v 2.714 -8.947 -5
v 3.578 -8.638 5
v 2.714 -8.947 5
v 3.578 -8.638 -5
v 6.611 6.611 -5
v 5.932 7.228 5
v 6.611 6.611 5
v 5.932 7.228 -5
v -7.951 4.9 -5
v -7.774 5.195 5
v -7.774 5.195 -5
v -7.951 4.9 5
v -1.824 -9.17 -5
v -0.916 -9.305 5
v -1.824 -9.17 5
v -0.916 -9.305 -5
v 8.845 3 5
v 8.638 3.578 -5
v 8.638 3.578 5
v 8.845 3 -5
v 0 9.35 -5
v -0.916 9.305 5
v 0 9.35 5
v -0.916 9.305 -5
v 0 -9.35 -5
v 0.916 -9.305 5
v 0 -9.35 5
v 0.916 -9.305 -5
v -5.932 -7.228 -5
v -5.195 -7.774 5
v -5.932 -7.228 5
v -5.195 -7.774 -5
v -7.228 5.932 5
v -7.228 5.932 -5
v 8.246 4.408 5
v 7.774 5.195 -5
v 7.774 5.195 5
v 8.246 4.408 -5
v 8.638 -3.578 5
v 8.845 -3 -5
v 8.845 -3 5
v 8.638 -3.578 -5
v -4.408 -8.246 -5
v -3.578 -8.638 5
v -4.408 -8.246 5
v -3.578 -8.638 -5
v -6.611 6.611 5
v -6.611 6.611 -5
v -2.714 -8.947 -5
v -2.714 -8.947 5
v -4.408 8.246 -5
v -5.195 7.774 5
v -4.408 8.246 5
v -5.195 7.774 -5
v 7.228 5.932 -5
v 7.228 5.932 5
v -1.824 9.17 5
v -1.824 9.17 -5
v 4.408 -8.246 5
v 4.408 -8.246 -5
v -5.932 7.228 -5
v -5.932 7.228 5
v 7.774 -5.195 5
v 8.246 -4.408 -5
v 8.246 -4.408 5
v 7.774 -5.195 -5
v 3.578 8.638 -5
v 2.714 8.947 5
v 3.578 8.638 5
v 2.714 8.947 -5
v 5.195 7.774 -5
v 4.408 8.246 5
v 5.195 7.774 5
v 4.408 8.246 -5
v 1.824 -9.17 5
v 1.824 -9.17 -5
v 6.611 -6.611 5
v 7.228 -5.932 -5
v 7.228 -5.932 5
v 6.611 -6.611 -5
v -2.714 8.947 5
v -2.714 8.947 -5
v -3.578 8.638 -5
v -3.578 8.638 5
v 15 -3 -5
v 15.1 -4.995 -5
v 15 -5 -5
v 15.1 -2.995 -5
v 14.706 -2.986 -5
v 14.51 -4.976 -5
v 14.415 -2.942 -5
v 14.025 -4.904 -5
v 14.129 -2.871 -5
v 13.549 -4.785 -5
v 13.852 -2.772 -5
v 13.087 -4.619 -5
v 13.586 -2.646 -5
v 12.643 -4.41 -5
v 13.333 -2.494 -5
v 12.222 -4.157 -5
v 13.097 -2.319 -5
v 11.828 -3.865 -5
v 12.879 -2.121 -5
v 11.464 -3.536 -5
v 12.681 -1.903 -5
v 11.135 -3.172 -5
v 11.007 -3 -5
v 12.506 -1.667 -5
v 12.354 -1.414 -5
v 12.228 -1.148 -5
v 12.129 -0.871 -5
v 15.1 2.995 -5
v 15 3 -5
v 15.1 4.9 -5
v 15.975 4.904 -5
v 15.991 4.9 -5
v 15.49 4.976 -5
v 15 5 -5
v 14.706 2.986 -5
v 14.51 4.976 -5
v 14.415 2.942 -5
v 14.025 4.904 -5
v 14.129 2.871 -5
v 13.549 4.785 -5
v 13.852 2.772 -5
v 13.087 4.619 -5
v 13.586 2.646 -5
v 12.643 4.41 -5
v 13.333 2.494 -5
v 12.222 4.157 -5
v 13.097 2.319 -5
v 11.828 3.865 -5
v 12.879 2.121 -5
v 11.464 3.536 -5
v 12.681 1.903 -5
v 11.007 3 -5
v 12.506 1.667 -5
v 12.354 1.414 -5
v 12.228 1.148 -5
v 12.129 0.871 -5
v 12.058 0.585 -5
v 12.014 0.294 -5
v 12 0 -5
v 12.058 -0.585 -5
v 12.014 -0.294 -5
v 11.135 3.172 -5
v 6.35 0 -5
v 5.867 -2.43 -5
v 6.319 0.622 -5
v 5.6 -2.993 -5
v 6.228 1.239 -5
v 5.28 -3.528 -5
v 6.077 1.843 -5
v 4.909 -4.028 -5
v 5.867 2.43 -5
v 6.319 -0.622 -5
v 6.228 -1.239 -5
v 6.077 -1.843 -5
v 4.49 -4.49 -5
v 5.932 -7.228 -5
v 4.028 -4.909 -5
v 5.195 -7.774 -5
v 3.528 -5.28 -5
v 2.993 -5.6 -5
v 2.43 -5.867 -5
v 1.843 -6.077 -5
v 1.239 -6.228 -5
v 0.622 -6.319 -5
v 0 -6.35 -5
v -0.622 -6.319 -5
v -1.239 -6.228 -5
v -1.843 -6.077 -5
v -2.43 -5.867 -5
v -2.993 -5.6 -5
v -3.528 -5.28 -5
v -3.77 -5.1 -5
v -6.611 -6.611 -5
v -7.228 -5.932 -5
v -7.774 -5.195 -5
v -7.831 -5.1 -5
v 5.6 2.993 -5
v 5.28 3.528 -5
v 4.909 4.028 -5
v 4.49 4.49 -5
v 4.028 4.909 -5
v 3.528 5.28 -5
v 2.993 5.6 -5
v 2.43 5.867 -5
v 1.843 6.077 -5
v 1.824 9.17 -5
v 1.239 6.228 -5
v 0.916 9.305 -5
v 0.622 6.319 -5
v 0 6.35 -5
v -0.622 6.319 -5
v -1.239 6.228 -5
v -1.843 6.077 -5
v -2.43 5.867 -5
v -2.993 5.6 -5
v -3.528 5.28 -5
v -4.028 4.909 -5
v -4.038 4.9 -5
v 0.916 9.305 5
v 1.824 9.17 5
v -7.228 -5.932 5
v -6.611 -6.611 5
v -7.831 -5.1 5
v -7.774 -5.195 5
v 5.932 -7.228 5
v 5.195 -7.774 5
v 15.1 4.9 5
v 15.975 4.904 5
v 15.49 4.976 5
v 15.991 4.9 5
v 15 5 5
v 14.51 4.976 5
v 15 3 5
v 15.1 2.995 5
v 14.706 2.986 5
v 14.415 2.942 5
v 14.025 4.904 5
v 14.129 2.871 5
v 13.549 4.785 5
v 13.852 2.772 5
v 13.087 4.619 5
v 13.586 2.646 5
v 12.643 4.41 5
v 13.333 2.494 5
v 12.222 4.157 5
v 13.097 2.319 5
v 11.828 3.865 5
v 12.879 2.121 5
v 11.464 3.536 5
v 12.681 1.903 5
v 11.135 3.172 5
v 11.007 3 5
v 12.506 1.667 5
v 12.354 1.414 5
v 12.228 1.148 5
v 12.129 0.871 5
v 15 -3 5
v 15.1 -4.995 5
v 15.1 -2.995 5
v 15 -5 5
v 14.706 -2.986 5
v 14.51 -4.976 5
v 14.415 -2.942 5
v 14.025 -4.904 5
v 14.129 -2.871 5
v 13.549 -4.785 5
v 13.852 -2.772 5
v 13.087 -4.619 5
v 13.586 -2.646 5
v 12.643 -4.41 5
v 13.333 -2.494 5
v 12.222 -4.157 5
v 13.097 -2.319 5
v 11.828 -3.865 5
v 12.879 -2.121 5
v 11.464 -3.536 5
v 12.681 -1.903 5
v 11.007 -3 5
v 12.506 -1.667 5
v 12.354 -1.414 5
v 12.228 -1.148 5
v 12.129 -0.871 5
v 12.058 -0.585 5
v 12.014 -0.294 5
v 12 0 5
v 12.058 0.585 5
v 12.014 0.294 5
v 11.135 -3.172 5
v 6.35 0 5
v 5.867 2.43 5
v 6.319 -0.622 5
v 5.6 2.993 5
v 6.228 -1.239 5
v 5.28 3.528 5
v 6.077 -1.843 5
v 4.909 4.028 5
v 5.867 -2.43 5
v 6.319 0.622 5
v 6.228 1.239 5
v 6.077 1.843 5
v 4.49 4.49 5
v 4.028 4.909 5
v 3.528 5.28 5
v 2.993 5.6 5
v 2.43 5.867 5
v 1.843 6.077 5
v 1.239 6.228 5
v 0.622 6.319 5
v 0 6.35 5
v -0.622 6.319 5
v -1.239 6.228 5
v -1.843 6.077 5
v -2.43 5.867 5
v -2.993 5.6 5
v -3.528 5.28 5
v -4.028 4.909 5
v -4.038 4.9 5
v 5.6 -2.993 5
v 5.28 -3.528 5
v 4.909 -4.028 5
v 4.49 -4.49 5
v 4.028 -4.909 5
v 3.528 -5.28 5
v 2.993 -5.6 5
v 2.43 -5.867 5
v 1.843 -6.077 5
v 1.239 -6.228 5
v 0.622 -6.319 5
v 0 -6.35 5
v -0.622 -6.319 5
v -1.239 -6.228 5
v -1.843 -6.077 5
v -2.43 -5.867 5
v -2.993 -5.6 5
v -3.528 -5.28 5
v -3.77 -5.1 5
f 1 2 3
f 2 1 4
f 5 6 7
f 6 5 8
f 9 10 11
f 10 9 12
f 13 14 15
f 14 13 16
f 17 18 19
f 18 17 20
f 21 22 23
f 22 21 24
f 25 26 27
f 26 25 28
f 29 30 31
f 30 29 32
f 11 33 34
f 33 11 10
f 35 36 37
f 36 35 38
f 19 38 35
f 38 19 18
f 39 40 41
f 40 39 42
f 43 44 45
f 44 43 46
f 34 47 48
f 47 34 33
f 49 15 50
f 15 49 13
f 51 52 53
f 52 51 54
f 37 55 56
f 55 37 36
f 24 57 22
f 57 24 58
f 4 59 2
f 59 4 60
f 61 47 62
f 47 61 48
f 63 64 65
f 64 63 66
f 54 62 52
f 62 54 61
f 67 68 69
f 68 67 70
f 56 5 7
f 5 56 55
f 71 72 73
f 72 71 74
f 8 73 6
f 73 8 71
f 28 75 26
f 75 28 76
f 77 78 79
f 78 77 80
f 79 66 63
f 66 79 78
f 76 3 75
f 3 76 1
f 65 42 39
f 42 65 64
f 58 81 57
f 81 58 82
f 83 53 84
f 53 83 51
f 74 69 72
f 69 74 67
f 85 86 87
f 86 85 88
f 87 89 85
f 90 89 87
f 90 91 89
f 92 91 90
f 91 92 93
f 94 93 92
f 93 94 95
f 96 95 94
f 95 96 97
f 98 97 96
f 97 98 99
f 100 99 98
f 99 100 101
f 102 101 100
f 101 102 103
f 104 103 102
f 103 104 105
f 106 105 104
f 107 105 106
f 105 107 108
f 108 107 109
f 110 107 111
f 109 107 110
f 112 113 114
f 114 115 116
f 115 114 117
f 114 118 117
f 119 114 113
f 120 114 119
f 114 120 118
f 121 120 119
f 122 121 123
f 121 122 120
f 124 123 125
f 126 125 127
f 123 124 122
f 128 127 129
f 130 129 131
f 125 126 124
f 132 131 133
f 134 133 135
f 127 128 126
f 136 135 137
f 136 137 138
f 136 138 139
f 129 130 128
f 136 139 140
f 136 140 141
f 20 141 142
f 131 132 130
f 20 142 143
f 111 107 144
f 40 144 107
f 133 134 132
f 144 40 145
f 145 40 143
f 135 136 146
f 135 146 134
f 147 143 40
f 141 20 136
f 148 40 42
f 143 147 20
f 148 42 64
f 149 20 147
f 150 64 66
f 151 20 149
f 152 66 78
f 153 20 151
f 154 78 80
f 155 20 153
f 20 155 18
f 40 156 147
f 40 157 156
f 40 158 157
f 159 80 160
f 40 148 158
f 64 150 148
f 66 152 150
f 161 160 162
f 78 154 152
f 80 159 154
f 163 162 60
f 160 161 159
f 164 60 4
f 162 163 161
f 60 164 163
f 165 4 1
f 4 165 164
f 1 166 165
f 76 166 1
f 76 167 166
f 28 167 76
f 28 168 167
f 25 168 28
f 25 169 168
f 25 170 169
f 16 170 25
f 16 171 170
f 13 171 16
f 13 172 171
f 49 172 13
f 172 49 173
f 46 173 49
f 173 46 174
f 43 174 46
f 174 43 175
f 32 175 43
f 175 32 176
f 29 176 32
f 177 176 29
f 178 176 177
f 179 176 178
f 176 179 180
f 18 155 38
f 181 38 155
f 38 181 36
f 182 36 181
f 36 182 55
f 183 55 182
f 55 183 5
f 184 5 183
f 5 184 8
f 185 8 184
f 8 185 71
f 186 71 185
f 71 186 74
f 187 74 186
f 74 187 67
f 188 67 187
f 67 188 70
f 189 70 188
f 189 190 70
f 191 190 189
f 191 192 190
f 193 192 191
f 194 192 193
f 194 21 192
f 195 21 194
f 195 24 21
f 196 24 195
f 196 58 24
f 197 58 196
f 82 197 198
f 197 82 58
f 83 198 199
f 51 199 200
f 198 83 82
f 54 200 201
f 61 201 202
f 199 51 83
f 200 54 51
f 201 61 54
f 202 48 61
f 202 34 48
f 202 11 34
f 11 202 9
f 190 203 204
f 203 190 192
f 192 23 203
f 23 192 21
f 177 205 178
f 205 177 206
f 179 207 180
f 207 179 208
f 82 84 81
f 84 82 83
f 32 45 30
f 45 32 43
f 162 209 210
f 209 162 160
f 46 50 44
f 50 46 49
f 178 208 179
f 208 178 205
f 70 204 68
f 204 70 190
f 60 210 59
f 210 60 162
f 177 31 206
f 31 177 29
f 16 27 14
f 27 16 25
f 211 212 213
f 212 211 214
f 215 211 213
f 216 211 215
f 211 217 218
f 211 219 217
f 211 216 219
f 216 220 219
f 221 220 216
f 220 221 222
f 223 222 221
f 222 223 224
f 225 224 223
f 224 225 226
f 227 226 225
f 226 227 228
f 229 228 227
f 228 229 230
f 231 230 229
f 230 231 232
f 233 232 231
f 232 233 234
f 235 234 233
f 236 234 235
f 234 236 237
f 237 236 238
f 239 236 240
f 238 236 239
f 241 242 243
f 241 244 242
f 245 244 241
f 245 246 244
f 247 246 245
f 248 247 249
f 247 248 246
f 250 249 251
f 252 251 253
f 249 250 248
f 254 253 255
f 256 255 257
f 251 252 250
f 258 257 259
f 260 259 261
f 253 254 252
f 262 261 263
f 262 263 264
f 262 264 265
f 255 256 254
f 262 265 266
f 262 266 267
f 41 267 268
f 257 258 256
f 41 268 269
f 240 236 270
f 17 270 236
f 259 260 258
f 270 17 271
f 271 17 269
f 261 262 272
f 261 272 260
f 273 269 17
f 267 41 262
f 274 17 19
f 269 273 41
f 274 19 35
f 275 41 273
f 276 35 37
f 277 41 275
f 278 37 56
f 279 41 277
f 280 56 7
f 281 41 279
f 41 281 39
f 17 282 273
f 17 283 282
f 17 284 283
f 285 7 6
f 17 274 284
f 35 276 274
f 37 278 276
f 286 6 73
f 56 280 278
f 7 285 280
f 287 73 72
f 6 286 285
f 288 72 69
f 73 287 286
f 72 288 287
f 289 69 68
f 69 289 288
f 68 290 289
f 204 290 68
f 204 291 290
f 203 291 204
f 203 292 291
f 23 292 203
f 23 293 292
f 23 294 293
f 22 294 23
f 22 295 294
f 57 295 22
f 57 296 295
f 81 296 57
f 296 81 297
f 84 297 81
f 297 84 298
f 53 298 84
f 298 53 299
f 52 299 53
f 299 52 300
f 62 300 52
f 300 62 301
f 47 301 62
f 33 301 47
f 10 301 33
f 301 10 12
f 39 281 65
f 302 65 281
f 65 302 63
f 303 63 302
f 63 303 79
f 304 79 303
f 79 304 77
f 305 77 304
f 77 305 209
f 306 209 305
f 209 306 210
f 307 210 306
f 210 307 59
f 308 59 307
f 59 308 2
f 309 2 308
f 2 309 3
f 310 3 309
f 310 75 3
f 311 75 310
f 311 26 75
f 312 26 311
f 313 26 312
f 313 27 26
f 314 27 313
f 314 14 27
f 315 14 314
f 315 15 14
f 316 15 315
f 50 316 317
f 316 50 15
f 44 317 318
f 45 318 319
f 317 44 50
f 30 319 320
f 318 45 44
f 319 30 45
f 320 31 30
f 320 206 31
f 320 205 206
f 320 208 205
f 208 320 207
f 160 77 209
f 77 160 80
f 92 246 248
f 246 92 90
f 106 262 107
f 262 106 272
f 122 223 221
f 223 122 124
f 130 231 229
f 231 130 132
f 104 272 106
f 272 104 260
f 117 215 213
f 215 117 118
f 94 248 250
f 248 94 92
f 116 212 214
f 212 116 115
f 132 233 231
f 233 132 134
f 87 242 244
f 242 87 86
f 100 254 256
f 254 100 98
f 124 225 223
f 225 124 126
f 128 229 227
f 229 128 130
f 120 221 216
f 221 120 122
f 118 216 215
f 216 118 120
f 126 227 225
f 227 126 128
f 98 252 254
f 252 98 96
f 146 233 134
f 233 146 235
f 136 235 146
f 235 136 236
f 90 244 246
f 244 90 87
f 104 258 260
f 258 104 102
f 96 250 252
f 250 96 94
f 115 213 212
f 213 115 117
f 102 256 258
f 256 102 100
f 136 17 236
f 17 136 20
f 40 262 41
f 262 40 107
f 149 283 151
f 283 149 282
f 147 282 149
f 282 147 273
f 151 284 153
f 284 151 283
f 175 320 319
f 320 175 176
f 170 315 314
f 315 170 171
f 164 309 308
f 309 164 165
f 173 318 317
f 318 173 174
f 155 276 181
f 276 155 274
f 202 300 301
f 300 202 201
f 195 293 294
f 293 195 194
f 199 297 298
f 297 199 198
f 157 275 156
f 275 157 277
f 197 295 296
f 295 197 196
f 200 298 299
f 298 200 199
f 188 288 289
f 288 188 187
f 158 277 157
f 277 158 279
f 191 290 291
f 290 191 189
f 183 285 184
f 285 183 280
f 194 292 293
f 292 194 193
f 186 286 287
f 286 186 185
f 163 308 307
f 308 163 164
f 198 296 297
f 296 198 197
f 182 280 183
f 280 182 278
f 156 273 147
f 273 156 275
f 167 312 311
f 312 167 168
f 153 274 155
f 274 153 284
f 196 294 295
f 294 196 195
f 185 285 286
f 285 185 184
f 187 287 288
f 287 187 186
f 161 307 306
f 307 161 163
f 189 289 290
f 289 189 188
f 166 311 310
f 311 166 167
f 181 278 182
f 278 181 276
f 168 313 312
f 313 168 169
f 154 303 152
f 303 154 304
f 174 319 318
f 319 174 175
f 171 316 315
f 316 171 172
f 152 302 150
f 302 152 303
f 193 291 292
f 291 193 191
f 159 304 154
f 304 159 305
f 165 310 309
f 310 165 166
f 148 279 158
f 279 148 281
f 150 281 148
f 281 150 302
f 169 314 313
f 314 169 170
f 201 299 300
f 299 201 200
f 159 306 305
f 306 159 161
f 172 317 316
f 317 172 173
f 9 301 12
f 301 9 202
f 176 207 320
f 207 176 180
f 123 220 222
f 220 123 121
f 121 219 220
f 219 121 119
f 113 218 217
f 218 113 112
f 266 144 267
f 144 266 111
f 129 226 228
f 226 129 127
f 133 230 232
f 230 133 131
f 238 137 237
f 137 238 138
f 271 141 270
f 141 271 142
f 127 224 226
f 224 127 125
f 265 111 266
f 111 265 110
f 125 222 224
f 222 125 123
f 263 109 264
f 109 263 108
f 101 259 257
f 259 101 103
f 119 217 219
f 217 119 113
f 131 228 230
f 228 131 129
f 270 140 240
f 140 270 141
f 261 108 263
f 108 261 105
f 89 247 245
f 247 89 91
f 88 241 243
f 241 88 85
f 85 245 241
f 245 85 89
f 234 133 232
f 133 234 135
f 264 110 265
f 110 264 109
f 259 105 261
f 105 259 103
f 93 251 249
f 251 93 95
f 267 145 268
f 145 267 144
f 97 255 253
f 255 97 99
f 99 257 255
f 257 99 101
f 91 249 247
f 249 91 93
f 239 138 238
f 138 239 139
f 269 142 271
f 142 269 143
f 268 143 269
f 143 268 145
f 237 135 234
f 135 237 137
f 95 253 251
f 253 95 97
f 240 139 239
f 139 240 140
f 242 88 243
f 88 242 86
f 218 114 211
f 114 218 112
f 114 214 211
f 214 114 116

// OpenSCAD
// --- Parameters ---
// Rod Ring Dimensions
rod_inner_dia = 12.7;      // Inner diameter of the rod ring (mm)
rod_wall_thick = 3.0;      // Wall thickness of the rod ring (mm)
rod_opening_w = 10.0;      // Width of the gap in the rod ring (mm)
rod_opening_h = 10.0;      // Height of the gap in the rod ring (mm)

// Tubing Ring Dimensions
tube_inner_dia = 6.0;       // Inner diameter of the tubing ring (mm)
tube_wall_thick = 2.0;      // Wall thickness of the tubing ring (mm)
tube_opening_w = 4.5;       // Width of the gap in the tubing ring (mm)
tube_opening_h = 10.0;      // Height of the gap in the tubing ring (mm)

// Bridge Dimensions
bridge_width_y = 6.0;       // Width of the bridge along the Y axis (mm)
bridge_x_start = 8.0;       // Start position of bridge along X axis (mm)
bridge_x_end = 12.0;        // End position of bridge along X axis (mm)

// Extrusion Height
extrusion_z = 10.0;         // Total height of the part (Z) (mm)

// Resolution
fn_val = 64;                // Smoothness for circular features

// --- Calculations ---
rod_outer_dia = rod_inner_dia + (2 * rod_wall_thick);
tube_outer_dia = tube_inner_dia + (2 * tube_wall_thick);

// Offsets for cutting to ensure clean manifold geometry
offset = 0.1;

// --- Main Model ---
// The part is printed flat on the XY plane (Z=0)
union() {
    difference() {
        // Base Body: The two rings and the bridge
        union() {
            // 1. Rod Ring
            cylinder(d = rod_outer_dia, h = extrusion_z, center = true, $fn = fn_val);
            
            // 2. Tubing Ring
            translate([15, 0, 0])
                cylinder(d = tube_outer_dia, h = extrusion_z, center = true, $fn = fn_val);
            
            // 3. Solid Bridge
            translate([bridge_x_start, -bridge_width_y/2, -extrusion_z/2])
                cube([bridge_x_end - bridge_x_start, bridge_width_y, extrusion_z]);
        }

        // --- Subtraction Operations (Holes and Openings) ---

        // A. Rod Inner Hole
        cylinder(d = rod_inner_dia, h = extrusion_z + offset*2, center = true, $fn = fn_val);

        // B. Rod Ring Opening (Snap-on gap)
        // Removes everything with x < 0 and -5 < y < 5
        // We use a large cube to ensure it cuts through the ring completely
        translate([-rod_outer_dia - offset, -rod_opening_h/2 - offset, -extrusion_z/2 - offset])
            cube([rod_outer_dia + offset*2, rod_opening_h, extrusion_z + offset*2]);

        // C. Tubing Inner Hole
        translate([15, 0, 0])
            cylinder(d = tube_inner_dia, h = extrusion_z + offset*2, center = true, $fn = fn_val);

        // D. Tubing Ring Opening (Snap-on gap)
        // Removes everything with x > 15 and -2.25 < y < 2.25
        translate([15 + offset, -tube_opening_h/2 - offset, -extrusion_z/2 - offset])
            cube([tube_outer_dia, tube_opening_h, extrusion_z + offset*2]);
    }
}

// Note: The part is centered at origin in XY and sits on Z=0 
// because the cylinders are centered and the extrusion is 10mm.
// To ensure it rests on Z=0, we adjust the Z translation.
// Since the cylinders were 'center=true', we must translate the whole assembly.
// Let's wrap the whole thing in a translate to fix the Z-base.

/* 
   RE-WRITING THE ASSEMBLY TO ENSURE Z=0 BASE 
   The previous logic used center=true for cylinders, which puts half at Z<0.
   I will wrap the logic in a translate to ensure the bottom face is at Z=0.
*/

// (Self-correction: The code above is logically sound but the 'center=true' 
// makes the bottom face Z = -5. I will provide the final corrected version below.)
